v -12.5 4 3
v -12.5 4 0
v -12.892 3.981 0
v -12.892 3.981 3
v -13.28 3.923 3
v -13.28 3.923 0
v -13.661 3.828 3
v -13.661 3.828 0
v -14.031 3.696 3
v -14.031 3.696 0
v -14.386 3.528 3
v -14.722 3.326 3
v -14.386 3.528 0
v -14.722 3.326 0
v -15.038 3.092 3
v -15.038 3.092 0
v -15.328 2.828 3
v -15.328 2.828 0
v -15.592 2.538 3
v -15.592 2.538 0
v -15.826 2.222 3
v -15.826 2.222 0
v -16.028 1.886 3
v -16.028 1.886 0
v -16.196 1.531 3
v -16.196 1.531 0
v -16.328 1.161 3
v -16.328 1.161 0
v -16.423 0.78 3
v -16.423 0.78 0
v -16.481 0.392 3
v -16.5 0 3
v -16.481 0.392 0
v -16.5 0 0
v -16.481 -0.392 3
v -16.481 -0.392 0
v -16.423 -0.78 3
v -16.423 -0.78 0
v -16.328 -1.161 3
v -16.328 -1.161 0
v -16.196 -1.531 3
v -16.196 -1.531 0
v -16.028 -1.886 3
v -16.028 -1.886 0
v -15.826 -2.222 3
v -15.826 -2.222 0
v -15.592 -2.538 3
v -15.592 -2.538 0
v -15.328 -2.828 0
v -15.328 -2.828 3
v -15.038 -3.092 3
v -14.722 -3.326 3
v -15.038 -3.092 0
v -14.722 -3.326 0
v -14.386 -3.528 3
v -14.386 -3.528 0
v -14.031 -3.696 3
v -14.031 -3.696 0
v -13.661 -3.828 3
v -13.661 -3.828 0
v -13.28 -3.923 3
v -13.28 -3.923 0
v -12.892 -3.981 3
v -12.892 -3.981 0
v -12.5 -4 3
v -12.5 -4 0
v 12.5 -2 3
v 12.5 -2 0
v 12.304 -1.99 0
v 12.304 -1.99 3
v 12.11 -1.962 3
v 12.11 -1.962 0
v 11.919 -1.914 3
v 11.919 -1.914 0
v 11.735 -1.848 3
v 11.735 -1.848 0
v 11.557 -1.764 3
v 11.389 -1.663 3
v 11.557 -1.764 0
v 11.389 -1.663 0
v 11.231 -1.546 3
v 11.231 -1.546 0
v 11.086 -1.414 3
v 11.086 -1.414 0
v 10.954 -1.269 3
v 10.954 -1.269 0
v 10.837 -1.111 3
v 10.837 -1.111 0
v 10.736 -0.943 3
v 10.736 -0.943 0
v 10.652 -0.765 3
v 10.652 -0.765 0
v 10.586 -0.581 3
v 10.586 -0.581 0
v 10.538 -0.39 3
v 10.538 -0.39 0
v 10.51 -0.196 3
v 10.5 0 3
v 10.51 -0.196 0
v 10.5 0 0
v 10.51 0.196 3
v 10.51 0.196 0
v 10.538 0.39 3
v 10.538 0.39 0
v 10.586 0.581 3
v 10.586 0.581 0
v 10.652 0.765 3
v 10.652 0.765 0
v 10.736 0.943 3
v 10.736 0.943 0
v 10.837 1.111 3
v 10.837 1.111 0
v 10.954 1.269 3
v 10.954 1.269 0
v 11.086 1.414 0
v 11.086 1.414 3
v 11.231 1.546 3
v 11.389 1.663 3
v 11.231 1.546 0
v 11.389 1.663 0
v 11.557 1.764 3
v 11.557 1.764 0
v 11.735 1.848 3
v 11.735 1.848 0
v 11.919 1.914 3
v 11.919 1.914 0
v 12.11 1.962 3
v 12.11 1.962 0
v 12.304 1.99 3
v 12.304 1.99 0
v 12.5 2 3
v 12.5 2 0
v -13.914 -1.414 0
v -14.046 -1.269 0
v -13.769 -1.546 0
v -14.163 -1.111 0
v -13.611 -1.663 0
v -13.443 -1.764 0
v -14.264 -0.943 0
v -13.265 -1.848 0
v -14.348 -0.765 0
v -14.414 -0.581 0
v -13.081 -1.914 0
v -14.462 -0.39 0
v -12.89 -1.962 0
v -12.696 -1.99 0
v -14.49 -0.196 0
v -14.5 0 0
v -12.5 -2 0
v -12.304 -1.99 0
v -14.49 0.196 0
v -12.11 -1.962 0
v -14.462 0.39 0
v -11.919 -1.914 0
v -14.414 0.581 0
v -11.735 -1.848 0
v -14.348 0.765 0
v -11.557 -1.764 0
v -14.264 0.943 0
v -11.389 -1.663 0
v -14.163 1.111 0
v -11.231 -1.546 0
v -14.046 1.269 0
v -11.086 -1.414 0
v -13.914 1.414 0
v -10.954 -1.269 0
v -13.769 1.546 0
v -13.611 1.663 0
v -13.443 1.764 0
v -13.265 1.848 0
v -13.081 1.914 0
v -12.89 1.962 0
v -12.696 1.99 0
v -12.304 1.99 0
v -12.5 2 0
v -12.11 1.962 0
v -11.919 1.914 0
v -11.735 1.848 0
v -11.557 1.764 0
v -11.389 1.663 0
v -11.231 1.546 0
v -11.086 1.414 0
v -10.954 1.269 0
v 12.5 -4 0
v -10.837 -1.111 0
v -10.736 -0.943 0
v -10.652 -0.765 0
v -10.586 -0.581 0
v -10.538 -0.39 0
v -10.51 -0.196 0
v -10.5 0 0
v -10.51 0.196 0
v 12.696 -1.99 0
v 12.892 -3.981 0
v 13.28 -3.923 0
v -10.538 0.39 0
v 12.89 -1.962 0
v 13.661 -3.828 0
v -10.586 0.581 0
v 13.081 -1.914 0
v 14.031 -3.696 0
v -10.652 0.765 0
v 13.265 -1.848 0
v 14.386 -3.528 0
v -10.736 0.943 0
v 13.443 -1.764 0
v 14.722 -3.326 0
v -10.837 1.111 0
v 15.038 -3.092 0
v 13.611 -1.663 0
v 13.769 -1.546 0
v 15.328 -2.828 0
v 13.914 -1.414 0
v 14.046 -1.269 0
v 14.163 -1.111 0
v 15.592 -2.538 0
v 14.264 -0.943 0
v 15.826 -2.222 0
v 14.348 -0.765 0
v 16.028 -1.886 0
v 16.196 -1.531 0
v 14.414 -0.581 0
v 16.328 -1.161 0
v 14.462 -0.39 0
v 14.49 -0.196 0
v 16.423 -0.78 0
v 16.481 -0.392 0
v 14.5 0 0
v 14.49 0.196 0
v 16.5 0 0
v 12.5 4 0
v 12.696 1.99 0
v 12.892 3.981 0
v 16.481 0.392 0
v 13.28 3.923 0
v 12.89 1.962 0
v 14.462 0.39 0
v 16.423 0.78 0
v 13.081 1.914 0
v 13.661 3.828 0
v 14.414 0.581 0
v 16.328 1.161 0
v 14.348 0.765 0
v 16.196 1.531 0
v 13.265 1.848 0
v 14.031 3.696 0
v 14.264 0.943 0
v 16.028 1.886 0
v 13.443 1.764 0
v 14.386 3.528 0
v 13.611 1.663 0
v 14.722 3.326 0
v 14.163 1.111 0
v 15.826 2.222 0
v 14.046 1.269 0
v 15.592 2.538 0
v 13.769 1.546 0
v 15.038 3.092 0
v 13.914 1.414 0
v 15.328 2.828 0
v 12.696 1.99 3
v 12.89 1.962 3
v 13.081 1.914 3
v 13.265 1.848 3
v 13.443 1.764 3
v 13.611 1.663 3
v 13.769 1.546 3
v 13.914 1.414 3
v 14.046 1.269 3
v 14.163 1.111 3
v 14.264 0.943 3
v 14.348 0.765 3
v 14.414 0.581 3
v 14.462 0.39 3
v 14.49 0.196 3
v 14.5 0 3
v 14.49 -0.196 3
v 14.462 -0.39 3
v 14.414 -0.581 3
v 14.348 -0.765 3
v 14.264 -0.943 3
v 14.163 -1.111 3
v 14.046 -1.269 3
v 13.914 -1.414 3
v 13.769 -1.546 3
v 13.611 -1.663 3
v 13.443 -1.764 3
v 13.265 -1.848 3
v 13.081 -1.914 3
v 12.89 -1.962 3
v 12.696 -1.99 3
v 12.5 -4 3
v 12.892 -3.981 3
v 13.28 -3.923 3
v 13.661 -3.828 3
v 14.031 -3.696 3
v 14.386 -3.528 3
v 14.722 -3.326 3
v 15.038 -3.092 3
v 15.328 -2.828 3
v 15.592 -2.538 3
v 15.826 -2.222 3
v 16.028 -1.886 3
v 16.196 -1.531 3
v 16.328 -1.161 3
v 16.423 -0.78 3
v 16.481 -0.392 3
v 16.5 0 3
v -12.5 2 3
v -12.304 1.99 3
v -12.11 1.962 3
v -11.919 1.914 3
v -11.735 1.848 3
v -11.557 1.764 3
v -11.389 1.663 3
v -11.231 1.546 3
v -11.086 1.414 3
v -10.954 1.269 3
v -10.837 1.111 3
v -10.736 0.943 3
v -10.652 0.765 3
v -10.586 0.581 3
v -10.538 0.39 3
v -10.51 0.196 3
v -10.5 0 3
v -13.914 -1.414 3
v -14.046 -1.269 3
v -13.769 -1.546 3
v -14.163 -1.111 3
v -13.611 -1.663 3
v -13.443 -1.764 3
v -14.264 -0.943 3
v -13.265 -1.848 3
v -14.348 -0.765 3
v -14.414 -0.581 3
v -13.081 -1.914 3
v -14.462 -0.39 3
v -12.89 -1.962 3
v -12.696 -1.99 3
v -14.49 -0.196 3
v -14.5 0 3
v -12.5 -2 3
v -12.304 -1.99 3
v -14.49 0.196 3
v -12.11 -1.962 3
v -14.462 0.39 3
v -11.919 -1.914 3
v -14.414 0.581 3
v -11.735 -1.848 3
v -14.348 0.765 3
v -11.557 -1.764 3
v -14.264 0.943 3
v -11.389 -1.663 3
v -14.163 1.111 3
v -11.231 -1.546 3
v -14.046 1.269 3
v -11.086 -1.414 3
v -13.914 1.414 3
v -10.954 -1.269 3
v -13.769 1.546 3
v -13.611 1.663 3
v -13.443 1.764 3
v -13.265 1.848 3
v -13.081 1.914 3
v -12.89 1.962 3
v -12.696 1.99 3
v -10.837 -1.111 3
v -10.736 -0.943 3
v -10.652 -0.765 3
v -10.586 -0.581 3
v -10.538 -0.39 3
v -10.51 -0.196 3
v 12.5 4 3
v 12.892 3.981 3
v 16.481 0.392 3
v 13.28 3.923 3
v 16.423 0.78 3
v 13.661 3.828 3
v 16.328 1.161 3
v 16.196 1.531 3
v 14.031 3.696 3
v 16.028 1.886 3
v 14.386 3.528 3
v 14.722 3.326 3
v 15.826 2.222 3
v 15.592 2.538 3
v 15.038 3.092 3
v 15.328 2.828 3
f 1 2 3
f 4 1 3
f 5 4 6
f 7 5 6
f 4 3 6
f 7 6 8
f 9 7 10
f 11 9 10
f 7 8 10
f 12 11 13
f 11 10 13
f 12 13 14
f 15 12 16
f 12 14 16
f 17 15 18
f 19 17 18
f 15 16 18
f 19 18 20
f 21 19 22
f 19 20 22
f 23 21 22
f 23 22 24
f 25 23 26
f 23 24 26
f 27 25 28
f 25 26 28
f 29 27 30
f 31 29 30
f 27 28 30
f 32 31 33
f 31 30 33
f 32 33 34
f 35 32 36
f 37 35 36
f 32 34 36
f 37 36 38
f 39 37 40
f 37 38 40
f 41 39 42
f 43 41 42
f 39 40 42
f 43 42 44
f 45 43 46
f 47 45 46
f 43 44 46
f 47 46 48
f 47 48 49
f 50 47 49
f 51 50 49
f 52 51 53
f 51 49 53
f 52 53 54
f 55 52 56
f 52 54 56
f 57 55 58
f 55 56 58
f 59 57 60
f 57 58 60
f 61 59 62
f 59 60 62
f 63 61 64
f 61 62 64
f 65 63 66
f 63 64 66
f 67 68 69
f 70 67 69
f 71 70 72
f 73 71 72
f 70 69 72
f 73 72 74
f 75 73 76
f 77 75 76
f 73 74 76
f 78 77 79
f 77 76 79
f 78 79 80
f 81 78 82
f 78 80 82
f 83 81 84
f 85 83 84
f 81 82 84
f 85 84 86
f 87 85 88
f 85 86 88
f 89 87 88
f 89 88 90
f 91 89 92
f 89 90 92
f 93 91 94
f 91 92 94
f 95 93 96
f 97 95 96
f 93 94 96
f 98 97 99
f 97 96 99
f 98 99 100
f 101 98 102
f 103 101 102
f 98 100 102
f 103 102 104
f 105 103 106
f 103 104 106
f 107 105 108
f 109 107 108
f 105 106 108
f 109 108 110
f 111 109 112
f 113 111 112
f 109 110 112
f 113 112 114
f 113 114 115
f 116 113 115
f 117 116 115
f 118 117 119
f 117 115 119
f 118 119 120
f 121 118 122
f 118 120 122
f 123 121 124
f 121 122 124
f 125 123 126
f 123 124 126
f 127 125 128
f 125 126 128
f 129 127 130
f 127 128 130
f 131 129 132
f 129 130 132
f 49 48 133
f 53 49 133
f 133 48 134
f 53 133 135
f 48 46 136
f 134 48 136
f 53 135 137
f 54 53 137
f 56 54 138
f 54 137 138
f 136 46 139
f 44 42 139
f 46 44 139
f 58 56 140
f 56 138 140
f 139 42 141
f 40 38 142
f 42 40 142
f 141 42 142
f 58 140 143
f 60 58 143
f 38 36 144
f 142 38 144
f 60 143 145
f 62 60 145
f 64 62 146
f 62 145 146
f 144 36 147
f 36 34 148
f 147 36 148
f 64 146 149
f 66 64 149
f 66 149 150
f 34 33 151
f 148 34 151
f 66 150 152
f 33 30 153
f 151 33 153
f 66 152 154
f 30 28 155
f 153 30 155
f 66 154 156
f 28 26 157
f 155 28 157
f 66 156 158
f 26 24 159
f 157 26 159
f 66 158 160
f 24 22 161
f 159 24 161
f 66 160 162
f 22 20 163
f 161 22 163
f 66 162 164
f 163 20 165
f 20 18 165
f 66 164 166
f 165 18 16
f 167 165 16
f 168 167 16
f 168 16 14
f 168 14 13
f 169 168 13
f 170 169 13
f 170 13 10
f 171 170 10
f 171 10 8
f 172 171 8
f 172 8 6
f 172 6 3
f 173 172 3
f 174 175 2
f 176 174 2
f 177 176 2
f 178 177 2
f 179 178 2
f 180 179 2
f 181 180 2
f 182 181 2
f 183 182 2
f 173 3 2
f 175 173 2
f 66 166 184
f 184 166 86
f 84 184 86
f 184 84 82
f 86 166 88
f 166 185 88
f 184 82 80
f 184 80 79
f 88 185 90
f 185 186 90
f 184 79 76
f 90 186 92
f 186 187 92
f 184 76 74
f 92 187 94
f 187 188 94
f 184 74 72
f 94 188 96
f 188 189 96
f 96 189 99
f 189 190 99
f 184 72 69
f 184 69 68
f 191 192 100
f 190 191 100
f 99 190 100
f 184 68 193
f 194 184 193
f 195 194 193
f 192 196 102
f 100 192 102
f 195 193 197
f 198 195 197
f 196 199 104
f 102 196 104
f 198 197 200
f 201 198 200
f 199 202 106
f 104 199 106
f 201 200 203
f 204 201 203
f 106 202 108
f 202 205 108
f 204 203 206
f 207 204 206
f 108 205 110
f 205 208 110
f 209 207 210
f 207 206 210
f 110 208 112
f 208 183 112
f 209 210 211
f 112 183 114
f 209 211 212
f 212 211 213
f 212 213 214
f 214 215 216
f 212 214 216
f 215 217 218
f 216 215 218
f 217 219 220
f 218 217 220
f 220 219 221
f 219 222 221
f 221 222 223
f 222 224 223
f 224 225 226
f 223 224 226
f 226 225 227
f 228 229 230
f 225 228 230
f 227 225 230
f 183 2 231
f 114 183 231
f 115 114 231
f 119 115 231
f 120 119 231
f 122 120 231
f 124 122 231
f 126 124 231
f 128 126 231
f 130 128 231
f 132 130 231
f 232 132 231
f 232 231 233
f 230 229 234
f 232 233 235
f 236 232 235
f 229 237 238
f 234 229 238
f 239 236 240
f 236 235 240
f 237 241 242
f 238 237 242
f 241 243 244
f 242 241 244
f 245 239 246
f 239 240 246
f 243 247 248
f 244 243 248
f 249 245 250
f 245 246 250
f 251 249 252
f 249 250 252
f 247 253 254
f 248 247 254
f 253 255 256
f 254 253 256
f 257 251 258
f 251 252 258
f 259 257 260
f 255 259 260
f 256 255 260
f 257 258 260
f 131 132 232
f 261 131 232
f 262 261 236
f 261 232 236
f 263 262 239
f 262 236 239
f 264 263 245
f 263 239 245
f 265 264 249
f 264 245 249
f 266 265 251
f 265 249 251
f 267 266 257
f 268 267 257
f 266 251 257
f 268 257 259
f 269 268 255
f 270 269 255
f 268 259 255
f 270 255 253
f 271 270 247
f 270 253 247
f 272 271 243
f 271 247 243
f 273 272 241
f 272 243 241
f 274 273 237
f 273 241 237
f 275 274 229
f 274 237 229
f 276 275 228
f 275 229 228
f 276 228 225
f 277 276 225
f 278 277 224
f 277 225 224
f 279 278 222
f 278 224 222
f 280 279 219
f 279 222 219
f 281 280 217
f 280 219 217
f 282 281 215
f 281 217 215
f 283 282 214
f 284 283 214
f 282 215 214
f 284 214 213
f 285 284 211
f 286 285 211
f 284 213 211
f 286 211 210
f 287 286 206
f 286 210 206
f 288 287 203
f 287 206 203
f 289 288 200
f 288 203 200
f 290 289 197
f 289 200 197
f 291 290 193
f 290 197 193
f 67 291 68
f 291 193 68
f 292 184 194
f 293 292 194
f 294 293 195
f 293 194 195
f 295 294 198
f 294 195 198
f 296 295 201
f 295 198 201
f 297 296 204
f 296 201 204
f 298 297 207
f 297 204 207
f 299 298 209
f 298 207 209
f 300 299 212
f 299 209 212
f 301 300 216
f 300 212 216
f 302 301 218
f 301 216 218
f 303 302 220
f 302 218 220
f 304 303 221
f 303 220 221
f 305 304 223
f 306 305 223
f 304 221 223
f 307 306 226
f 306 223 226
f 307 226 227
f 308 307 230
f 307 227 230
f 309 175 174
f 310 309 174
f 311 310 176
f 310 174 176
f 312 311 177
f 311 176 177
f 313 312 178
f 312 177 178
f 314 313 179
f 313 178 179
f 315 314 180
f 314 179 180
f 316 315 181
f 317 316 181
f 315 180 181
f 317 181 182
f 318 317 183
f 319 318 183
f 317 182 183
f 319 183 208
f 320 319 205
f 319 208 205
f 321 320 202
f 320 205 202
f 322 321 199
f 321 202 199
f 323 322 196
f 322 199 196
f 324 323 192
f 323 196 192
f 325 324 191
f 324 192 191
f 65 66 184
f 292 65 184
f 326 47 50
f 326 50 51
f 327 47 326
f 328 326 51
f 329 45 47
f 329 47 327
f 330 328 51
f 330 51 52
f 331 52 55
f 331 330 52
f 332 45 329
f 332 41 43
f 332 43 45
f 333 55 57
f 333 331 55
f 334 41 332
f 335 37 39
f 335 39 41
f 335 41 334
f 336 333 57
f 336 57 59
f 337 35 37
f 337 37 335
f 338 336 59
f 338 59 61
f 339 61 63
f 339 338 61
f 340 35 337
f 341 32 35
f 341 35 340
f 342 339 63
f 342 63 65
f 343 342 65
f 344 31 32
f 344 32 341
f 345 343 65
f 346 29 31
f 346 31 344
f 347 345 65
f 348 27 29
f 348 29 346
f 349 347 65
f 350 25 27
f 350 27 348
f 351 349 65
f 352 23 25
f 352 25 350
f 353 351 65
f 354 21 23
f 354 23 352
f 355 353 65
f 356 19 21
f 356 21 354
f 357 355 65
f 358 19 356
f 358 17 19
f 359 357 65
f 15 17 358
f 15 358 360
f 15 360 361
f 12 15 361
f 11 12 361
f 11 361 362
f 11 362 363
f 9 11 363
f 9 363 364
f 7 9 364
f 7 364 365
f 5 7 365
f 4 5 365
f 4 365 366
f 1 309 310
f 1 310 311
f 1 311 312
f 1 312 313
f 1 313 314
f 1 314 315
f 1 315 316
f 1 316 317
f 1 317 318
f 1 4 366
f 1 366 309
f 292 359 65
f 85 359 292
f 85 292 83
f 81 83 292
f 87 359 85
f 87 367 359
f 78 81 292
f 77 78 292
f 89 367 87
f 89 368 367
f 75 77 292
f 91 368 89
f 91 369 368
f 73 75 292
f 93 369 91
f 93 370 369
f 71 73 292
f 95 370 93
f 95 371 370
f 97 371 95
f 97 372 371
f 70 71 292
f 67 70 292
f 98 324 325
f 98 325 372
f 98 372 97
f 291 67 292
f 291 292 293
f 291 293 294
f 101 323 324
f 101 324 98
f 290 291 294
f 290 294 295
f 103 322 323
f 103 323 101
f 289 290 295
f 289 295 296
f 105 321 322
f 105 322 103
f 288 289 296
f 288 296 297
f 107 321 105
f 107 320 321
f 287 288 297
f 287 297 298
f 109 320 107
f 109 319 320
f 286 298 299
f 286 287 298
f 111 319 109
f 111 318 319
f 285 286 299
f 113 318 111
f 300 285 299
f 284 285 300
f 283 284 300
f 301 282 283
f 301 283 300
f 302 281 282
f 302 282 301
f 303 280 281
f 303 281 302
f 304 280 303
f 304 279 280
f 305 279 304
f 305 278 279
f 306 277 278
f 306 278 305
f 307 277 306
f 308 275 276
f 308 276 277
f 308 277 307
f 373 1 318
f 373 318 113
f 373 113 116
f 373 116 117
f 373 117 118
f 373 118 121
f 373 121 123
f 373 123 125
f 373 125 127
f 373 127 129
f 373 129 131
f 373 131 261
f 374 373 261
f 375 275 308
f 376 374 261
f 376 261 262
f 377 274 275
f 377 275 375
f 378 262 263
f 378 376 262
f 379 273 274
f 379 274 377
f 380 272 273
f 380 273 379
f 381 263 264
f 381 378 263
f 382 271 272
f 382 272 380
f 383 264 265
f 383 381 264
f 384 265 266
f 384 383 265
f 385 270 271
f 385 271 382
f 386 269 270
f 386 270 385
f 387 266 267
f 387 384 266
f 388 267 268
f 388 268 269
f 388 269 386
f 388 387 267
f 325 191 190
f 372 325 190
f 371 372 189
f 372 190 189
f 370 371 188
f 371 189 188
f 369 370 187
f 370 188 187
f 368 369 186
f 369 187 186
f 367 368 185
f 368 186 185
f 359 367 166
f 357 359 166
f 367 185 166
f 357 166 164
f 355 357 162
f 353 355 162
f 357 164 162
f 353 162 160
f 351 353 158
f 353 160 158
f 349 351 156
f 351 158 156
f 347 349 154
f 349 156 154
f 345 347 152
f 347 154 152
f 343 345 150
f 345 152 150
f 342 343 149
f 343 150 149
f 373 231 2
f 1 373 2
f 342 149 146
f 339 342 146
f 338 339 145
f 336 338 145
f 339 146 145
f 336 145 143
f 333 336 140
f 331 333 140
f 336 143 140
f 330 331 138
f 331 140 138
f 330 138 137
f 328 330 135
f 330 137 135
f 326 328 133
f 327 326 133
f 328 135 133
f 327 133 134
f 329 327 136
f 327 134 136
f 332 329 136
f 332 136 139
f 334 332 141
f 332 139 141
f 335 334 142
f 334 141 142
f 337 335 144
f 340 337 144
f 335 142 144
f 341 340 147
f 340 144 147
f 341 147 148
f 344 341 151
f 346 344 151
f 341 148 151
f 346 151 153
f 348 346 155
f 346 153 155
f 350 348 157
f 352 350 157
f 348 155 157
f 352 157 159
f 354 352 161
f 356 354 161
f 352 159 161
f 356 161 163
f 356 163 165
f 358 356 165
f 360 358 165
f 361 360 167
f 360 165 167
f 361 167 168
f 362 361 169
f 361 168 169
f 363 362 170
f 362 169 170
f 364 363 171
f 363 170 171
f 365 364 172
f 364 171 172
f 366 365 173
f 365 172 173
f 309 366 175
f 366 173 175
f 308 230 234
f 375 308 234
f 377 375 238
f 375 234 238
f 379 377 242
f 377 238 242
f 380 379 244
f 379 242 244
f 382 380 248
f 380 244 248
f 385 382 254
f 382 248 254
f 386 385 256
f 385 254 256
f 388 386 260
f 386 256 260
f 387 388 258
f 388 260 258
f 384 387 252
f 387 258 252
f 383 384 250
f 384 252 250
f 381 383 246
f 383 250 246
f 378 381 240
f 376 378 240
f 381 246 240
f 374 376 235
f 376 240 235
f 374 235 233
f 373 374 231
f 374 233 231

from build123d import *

# Parameters (mm, degrees)
F1_DEPTH = 3


with BuildPart() as f1:
    # F0 (on Top) → F1 (new body)
    with BuildSketch(Plane.XY):
        with BuildLine():
            ThreePointArc((12.5, 4), (8.5, 0), (12.5, -4))
            Line((12.5, -4), (12.5, -2))
            ThreePointArc((12.5, -2), (10.5, 0), (12.5, 2))
            Line((12.5, 2), (12.5, 4))
        make_face()
        with BuildLine():
            Line((-12.5, -4), (12.5, -4))
            ThreePointArc((12.5, -4), (8.5, 0), (12.5, 4))
            Line((12.5, 4), (-12.5, 4))
            ThreePointArc((-12.5, 4), (-9.6715728753, 2.8284271247), (-8.5, 0))
            ThreePointArc((-8.5, 0), (-9.6715728753, -2.8284271247), (-12.5, -4))
        make_face()
        with BuildLine():
            Line((12.5, -2), (12.5, -4))
            ThreePointArc((12.5, -4), (15.3284271247, -2.8284271247), (16.5, 0))
            ThreePointArc((16.5, 0), (15.3284271247, 2.8284271247), (12.5, 4))
            Line((12.5, 4), (12.5, 2))
            ThreePointArc((12.5, 2), (13.9142135624, 1.4142135624), (14.5, 0))
            ThreePointArc((14.5, 0), (13.9142135624, -1.4142135624), (12.5, -2))
        make_face()
        with BuildLine():
            ThreePointArc((-12.5, 4), (-16.5, 0), (-12.5, -4))
            Line((-12.5, -4), (-12.5, -2))
            ThreePointArc((-12.5, -2), (-14.5, 0), (-12.5, 2))
            Line((-12.5, 2), (-12.5, 4))
        make_face()
        with BuildLine():
            Line((-12.5, -2), (-12.5, -4))
            ThreePointArc((-12.5, -4), (-9.6715728753, -2.8284271247), (-8.5, 0))
            ThreePointArc((-8.5, 0), (-9.6715728753, 2.8284271247), (-12.5, 4))
            Line((-12.5, 4), (-12.5, 2))
            ThreePointArc((-12.5, 2), (-11.0857864376, 1.4142135624), (-10.5, 0))
            ThreePointArc((-10.5, 0), (-11.0857864376, -1.4142135624), (-12.5, -2))
        make_face()
    extrude(amount=F1_DEPTH)


solid = f1.part
